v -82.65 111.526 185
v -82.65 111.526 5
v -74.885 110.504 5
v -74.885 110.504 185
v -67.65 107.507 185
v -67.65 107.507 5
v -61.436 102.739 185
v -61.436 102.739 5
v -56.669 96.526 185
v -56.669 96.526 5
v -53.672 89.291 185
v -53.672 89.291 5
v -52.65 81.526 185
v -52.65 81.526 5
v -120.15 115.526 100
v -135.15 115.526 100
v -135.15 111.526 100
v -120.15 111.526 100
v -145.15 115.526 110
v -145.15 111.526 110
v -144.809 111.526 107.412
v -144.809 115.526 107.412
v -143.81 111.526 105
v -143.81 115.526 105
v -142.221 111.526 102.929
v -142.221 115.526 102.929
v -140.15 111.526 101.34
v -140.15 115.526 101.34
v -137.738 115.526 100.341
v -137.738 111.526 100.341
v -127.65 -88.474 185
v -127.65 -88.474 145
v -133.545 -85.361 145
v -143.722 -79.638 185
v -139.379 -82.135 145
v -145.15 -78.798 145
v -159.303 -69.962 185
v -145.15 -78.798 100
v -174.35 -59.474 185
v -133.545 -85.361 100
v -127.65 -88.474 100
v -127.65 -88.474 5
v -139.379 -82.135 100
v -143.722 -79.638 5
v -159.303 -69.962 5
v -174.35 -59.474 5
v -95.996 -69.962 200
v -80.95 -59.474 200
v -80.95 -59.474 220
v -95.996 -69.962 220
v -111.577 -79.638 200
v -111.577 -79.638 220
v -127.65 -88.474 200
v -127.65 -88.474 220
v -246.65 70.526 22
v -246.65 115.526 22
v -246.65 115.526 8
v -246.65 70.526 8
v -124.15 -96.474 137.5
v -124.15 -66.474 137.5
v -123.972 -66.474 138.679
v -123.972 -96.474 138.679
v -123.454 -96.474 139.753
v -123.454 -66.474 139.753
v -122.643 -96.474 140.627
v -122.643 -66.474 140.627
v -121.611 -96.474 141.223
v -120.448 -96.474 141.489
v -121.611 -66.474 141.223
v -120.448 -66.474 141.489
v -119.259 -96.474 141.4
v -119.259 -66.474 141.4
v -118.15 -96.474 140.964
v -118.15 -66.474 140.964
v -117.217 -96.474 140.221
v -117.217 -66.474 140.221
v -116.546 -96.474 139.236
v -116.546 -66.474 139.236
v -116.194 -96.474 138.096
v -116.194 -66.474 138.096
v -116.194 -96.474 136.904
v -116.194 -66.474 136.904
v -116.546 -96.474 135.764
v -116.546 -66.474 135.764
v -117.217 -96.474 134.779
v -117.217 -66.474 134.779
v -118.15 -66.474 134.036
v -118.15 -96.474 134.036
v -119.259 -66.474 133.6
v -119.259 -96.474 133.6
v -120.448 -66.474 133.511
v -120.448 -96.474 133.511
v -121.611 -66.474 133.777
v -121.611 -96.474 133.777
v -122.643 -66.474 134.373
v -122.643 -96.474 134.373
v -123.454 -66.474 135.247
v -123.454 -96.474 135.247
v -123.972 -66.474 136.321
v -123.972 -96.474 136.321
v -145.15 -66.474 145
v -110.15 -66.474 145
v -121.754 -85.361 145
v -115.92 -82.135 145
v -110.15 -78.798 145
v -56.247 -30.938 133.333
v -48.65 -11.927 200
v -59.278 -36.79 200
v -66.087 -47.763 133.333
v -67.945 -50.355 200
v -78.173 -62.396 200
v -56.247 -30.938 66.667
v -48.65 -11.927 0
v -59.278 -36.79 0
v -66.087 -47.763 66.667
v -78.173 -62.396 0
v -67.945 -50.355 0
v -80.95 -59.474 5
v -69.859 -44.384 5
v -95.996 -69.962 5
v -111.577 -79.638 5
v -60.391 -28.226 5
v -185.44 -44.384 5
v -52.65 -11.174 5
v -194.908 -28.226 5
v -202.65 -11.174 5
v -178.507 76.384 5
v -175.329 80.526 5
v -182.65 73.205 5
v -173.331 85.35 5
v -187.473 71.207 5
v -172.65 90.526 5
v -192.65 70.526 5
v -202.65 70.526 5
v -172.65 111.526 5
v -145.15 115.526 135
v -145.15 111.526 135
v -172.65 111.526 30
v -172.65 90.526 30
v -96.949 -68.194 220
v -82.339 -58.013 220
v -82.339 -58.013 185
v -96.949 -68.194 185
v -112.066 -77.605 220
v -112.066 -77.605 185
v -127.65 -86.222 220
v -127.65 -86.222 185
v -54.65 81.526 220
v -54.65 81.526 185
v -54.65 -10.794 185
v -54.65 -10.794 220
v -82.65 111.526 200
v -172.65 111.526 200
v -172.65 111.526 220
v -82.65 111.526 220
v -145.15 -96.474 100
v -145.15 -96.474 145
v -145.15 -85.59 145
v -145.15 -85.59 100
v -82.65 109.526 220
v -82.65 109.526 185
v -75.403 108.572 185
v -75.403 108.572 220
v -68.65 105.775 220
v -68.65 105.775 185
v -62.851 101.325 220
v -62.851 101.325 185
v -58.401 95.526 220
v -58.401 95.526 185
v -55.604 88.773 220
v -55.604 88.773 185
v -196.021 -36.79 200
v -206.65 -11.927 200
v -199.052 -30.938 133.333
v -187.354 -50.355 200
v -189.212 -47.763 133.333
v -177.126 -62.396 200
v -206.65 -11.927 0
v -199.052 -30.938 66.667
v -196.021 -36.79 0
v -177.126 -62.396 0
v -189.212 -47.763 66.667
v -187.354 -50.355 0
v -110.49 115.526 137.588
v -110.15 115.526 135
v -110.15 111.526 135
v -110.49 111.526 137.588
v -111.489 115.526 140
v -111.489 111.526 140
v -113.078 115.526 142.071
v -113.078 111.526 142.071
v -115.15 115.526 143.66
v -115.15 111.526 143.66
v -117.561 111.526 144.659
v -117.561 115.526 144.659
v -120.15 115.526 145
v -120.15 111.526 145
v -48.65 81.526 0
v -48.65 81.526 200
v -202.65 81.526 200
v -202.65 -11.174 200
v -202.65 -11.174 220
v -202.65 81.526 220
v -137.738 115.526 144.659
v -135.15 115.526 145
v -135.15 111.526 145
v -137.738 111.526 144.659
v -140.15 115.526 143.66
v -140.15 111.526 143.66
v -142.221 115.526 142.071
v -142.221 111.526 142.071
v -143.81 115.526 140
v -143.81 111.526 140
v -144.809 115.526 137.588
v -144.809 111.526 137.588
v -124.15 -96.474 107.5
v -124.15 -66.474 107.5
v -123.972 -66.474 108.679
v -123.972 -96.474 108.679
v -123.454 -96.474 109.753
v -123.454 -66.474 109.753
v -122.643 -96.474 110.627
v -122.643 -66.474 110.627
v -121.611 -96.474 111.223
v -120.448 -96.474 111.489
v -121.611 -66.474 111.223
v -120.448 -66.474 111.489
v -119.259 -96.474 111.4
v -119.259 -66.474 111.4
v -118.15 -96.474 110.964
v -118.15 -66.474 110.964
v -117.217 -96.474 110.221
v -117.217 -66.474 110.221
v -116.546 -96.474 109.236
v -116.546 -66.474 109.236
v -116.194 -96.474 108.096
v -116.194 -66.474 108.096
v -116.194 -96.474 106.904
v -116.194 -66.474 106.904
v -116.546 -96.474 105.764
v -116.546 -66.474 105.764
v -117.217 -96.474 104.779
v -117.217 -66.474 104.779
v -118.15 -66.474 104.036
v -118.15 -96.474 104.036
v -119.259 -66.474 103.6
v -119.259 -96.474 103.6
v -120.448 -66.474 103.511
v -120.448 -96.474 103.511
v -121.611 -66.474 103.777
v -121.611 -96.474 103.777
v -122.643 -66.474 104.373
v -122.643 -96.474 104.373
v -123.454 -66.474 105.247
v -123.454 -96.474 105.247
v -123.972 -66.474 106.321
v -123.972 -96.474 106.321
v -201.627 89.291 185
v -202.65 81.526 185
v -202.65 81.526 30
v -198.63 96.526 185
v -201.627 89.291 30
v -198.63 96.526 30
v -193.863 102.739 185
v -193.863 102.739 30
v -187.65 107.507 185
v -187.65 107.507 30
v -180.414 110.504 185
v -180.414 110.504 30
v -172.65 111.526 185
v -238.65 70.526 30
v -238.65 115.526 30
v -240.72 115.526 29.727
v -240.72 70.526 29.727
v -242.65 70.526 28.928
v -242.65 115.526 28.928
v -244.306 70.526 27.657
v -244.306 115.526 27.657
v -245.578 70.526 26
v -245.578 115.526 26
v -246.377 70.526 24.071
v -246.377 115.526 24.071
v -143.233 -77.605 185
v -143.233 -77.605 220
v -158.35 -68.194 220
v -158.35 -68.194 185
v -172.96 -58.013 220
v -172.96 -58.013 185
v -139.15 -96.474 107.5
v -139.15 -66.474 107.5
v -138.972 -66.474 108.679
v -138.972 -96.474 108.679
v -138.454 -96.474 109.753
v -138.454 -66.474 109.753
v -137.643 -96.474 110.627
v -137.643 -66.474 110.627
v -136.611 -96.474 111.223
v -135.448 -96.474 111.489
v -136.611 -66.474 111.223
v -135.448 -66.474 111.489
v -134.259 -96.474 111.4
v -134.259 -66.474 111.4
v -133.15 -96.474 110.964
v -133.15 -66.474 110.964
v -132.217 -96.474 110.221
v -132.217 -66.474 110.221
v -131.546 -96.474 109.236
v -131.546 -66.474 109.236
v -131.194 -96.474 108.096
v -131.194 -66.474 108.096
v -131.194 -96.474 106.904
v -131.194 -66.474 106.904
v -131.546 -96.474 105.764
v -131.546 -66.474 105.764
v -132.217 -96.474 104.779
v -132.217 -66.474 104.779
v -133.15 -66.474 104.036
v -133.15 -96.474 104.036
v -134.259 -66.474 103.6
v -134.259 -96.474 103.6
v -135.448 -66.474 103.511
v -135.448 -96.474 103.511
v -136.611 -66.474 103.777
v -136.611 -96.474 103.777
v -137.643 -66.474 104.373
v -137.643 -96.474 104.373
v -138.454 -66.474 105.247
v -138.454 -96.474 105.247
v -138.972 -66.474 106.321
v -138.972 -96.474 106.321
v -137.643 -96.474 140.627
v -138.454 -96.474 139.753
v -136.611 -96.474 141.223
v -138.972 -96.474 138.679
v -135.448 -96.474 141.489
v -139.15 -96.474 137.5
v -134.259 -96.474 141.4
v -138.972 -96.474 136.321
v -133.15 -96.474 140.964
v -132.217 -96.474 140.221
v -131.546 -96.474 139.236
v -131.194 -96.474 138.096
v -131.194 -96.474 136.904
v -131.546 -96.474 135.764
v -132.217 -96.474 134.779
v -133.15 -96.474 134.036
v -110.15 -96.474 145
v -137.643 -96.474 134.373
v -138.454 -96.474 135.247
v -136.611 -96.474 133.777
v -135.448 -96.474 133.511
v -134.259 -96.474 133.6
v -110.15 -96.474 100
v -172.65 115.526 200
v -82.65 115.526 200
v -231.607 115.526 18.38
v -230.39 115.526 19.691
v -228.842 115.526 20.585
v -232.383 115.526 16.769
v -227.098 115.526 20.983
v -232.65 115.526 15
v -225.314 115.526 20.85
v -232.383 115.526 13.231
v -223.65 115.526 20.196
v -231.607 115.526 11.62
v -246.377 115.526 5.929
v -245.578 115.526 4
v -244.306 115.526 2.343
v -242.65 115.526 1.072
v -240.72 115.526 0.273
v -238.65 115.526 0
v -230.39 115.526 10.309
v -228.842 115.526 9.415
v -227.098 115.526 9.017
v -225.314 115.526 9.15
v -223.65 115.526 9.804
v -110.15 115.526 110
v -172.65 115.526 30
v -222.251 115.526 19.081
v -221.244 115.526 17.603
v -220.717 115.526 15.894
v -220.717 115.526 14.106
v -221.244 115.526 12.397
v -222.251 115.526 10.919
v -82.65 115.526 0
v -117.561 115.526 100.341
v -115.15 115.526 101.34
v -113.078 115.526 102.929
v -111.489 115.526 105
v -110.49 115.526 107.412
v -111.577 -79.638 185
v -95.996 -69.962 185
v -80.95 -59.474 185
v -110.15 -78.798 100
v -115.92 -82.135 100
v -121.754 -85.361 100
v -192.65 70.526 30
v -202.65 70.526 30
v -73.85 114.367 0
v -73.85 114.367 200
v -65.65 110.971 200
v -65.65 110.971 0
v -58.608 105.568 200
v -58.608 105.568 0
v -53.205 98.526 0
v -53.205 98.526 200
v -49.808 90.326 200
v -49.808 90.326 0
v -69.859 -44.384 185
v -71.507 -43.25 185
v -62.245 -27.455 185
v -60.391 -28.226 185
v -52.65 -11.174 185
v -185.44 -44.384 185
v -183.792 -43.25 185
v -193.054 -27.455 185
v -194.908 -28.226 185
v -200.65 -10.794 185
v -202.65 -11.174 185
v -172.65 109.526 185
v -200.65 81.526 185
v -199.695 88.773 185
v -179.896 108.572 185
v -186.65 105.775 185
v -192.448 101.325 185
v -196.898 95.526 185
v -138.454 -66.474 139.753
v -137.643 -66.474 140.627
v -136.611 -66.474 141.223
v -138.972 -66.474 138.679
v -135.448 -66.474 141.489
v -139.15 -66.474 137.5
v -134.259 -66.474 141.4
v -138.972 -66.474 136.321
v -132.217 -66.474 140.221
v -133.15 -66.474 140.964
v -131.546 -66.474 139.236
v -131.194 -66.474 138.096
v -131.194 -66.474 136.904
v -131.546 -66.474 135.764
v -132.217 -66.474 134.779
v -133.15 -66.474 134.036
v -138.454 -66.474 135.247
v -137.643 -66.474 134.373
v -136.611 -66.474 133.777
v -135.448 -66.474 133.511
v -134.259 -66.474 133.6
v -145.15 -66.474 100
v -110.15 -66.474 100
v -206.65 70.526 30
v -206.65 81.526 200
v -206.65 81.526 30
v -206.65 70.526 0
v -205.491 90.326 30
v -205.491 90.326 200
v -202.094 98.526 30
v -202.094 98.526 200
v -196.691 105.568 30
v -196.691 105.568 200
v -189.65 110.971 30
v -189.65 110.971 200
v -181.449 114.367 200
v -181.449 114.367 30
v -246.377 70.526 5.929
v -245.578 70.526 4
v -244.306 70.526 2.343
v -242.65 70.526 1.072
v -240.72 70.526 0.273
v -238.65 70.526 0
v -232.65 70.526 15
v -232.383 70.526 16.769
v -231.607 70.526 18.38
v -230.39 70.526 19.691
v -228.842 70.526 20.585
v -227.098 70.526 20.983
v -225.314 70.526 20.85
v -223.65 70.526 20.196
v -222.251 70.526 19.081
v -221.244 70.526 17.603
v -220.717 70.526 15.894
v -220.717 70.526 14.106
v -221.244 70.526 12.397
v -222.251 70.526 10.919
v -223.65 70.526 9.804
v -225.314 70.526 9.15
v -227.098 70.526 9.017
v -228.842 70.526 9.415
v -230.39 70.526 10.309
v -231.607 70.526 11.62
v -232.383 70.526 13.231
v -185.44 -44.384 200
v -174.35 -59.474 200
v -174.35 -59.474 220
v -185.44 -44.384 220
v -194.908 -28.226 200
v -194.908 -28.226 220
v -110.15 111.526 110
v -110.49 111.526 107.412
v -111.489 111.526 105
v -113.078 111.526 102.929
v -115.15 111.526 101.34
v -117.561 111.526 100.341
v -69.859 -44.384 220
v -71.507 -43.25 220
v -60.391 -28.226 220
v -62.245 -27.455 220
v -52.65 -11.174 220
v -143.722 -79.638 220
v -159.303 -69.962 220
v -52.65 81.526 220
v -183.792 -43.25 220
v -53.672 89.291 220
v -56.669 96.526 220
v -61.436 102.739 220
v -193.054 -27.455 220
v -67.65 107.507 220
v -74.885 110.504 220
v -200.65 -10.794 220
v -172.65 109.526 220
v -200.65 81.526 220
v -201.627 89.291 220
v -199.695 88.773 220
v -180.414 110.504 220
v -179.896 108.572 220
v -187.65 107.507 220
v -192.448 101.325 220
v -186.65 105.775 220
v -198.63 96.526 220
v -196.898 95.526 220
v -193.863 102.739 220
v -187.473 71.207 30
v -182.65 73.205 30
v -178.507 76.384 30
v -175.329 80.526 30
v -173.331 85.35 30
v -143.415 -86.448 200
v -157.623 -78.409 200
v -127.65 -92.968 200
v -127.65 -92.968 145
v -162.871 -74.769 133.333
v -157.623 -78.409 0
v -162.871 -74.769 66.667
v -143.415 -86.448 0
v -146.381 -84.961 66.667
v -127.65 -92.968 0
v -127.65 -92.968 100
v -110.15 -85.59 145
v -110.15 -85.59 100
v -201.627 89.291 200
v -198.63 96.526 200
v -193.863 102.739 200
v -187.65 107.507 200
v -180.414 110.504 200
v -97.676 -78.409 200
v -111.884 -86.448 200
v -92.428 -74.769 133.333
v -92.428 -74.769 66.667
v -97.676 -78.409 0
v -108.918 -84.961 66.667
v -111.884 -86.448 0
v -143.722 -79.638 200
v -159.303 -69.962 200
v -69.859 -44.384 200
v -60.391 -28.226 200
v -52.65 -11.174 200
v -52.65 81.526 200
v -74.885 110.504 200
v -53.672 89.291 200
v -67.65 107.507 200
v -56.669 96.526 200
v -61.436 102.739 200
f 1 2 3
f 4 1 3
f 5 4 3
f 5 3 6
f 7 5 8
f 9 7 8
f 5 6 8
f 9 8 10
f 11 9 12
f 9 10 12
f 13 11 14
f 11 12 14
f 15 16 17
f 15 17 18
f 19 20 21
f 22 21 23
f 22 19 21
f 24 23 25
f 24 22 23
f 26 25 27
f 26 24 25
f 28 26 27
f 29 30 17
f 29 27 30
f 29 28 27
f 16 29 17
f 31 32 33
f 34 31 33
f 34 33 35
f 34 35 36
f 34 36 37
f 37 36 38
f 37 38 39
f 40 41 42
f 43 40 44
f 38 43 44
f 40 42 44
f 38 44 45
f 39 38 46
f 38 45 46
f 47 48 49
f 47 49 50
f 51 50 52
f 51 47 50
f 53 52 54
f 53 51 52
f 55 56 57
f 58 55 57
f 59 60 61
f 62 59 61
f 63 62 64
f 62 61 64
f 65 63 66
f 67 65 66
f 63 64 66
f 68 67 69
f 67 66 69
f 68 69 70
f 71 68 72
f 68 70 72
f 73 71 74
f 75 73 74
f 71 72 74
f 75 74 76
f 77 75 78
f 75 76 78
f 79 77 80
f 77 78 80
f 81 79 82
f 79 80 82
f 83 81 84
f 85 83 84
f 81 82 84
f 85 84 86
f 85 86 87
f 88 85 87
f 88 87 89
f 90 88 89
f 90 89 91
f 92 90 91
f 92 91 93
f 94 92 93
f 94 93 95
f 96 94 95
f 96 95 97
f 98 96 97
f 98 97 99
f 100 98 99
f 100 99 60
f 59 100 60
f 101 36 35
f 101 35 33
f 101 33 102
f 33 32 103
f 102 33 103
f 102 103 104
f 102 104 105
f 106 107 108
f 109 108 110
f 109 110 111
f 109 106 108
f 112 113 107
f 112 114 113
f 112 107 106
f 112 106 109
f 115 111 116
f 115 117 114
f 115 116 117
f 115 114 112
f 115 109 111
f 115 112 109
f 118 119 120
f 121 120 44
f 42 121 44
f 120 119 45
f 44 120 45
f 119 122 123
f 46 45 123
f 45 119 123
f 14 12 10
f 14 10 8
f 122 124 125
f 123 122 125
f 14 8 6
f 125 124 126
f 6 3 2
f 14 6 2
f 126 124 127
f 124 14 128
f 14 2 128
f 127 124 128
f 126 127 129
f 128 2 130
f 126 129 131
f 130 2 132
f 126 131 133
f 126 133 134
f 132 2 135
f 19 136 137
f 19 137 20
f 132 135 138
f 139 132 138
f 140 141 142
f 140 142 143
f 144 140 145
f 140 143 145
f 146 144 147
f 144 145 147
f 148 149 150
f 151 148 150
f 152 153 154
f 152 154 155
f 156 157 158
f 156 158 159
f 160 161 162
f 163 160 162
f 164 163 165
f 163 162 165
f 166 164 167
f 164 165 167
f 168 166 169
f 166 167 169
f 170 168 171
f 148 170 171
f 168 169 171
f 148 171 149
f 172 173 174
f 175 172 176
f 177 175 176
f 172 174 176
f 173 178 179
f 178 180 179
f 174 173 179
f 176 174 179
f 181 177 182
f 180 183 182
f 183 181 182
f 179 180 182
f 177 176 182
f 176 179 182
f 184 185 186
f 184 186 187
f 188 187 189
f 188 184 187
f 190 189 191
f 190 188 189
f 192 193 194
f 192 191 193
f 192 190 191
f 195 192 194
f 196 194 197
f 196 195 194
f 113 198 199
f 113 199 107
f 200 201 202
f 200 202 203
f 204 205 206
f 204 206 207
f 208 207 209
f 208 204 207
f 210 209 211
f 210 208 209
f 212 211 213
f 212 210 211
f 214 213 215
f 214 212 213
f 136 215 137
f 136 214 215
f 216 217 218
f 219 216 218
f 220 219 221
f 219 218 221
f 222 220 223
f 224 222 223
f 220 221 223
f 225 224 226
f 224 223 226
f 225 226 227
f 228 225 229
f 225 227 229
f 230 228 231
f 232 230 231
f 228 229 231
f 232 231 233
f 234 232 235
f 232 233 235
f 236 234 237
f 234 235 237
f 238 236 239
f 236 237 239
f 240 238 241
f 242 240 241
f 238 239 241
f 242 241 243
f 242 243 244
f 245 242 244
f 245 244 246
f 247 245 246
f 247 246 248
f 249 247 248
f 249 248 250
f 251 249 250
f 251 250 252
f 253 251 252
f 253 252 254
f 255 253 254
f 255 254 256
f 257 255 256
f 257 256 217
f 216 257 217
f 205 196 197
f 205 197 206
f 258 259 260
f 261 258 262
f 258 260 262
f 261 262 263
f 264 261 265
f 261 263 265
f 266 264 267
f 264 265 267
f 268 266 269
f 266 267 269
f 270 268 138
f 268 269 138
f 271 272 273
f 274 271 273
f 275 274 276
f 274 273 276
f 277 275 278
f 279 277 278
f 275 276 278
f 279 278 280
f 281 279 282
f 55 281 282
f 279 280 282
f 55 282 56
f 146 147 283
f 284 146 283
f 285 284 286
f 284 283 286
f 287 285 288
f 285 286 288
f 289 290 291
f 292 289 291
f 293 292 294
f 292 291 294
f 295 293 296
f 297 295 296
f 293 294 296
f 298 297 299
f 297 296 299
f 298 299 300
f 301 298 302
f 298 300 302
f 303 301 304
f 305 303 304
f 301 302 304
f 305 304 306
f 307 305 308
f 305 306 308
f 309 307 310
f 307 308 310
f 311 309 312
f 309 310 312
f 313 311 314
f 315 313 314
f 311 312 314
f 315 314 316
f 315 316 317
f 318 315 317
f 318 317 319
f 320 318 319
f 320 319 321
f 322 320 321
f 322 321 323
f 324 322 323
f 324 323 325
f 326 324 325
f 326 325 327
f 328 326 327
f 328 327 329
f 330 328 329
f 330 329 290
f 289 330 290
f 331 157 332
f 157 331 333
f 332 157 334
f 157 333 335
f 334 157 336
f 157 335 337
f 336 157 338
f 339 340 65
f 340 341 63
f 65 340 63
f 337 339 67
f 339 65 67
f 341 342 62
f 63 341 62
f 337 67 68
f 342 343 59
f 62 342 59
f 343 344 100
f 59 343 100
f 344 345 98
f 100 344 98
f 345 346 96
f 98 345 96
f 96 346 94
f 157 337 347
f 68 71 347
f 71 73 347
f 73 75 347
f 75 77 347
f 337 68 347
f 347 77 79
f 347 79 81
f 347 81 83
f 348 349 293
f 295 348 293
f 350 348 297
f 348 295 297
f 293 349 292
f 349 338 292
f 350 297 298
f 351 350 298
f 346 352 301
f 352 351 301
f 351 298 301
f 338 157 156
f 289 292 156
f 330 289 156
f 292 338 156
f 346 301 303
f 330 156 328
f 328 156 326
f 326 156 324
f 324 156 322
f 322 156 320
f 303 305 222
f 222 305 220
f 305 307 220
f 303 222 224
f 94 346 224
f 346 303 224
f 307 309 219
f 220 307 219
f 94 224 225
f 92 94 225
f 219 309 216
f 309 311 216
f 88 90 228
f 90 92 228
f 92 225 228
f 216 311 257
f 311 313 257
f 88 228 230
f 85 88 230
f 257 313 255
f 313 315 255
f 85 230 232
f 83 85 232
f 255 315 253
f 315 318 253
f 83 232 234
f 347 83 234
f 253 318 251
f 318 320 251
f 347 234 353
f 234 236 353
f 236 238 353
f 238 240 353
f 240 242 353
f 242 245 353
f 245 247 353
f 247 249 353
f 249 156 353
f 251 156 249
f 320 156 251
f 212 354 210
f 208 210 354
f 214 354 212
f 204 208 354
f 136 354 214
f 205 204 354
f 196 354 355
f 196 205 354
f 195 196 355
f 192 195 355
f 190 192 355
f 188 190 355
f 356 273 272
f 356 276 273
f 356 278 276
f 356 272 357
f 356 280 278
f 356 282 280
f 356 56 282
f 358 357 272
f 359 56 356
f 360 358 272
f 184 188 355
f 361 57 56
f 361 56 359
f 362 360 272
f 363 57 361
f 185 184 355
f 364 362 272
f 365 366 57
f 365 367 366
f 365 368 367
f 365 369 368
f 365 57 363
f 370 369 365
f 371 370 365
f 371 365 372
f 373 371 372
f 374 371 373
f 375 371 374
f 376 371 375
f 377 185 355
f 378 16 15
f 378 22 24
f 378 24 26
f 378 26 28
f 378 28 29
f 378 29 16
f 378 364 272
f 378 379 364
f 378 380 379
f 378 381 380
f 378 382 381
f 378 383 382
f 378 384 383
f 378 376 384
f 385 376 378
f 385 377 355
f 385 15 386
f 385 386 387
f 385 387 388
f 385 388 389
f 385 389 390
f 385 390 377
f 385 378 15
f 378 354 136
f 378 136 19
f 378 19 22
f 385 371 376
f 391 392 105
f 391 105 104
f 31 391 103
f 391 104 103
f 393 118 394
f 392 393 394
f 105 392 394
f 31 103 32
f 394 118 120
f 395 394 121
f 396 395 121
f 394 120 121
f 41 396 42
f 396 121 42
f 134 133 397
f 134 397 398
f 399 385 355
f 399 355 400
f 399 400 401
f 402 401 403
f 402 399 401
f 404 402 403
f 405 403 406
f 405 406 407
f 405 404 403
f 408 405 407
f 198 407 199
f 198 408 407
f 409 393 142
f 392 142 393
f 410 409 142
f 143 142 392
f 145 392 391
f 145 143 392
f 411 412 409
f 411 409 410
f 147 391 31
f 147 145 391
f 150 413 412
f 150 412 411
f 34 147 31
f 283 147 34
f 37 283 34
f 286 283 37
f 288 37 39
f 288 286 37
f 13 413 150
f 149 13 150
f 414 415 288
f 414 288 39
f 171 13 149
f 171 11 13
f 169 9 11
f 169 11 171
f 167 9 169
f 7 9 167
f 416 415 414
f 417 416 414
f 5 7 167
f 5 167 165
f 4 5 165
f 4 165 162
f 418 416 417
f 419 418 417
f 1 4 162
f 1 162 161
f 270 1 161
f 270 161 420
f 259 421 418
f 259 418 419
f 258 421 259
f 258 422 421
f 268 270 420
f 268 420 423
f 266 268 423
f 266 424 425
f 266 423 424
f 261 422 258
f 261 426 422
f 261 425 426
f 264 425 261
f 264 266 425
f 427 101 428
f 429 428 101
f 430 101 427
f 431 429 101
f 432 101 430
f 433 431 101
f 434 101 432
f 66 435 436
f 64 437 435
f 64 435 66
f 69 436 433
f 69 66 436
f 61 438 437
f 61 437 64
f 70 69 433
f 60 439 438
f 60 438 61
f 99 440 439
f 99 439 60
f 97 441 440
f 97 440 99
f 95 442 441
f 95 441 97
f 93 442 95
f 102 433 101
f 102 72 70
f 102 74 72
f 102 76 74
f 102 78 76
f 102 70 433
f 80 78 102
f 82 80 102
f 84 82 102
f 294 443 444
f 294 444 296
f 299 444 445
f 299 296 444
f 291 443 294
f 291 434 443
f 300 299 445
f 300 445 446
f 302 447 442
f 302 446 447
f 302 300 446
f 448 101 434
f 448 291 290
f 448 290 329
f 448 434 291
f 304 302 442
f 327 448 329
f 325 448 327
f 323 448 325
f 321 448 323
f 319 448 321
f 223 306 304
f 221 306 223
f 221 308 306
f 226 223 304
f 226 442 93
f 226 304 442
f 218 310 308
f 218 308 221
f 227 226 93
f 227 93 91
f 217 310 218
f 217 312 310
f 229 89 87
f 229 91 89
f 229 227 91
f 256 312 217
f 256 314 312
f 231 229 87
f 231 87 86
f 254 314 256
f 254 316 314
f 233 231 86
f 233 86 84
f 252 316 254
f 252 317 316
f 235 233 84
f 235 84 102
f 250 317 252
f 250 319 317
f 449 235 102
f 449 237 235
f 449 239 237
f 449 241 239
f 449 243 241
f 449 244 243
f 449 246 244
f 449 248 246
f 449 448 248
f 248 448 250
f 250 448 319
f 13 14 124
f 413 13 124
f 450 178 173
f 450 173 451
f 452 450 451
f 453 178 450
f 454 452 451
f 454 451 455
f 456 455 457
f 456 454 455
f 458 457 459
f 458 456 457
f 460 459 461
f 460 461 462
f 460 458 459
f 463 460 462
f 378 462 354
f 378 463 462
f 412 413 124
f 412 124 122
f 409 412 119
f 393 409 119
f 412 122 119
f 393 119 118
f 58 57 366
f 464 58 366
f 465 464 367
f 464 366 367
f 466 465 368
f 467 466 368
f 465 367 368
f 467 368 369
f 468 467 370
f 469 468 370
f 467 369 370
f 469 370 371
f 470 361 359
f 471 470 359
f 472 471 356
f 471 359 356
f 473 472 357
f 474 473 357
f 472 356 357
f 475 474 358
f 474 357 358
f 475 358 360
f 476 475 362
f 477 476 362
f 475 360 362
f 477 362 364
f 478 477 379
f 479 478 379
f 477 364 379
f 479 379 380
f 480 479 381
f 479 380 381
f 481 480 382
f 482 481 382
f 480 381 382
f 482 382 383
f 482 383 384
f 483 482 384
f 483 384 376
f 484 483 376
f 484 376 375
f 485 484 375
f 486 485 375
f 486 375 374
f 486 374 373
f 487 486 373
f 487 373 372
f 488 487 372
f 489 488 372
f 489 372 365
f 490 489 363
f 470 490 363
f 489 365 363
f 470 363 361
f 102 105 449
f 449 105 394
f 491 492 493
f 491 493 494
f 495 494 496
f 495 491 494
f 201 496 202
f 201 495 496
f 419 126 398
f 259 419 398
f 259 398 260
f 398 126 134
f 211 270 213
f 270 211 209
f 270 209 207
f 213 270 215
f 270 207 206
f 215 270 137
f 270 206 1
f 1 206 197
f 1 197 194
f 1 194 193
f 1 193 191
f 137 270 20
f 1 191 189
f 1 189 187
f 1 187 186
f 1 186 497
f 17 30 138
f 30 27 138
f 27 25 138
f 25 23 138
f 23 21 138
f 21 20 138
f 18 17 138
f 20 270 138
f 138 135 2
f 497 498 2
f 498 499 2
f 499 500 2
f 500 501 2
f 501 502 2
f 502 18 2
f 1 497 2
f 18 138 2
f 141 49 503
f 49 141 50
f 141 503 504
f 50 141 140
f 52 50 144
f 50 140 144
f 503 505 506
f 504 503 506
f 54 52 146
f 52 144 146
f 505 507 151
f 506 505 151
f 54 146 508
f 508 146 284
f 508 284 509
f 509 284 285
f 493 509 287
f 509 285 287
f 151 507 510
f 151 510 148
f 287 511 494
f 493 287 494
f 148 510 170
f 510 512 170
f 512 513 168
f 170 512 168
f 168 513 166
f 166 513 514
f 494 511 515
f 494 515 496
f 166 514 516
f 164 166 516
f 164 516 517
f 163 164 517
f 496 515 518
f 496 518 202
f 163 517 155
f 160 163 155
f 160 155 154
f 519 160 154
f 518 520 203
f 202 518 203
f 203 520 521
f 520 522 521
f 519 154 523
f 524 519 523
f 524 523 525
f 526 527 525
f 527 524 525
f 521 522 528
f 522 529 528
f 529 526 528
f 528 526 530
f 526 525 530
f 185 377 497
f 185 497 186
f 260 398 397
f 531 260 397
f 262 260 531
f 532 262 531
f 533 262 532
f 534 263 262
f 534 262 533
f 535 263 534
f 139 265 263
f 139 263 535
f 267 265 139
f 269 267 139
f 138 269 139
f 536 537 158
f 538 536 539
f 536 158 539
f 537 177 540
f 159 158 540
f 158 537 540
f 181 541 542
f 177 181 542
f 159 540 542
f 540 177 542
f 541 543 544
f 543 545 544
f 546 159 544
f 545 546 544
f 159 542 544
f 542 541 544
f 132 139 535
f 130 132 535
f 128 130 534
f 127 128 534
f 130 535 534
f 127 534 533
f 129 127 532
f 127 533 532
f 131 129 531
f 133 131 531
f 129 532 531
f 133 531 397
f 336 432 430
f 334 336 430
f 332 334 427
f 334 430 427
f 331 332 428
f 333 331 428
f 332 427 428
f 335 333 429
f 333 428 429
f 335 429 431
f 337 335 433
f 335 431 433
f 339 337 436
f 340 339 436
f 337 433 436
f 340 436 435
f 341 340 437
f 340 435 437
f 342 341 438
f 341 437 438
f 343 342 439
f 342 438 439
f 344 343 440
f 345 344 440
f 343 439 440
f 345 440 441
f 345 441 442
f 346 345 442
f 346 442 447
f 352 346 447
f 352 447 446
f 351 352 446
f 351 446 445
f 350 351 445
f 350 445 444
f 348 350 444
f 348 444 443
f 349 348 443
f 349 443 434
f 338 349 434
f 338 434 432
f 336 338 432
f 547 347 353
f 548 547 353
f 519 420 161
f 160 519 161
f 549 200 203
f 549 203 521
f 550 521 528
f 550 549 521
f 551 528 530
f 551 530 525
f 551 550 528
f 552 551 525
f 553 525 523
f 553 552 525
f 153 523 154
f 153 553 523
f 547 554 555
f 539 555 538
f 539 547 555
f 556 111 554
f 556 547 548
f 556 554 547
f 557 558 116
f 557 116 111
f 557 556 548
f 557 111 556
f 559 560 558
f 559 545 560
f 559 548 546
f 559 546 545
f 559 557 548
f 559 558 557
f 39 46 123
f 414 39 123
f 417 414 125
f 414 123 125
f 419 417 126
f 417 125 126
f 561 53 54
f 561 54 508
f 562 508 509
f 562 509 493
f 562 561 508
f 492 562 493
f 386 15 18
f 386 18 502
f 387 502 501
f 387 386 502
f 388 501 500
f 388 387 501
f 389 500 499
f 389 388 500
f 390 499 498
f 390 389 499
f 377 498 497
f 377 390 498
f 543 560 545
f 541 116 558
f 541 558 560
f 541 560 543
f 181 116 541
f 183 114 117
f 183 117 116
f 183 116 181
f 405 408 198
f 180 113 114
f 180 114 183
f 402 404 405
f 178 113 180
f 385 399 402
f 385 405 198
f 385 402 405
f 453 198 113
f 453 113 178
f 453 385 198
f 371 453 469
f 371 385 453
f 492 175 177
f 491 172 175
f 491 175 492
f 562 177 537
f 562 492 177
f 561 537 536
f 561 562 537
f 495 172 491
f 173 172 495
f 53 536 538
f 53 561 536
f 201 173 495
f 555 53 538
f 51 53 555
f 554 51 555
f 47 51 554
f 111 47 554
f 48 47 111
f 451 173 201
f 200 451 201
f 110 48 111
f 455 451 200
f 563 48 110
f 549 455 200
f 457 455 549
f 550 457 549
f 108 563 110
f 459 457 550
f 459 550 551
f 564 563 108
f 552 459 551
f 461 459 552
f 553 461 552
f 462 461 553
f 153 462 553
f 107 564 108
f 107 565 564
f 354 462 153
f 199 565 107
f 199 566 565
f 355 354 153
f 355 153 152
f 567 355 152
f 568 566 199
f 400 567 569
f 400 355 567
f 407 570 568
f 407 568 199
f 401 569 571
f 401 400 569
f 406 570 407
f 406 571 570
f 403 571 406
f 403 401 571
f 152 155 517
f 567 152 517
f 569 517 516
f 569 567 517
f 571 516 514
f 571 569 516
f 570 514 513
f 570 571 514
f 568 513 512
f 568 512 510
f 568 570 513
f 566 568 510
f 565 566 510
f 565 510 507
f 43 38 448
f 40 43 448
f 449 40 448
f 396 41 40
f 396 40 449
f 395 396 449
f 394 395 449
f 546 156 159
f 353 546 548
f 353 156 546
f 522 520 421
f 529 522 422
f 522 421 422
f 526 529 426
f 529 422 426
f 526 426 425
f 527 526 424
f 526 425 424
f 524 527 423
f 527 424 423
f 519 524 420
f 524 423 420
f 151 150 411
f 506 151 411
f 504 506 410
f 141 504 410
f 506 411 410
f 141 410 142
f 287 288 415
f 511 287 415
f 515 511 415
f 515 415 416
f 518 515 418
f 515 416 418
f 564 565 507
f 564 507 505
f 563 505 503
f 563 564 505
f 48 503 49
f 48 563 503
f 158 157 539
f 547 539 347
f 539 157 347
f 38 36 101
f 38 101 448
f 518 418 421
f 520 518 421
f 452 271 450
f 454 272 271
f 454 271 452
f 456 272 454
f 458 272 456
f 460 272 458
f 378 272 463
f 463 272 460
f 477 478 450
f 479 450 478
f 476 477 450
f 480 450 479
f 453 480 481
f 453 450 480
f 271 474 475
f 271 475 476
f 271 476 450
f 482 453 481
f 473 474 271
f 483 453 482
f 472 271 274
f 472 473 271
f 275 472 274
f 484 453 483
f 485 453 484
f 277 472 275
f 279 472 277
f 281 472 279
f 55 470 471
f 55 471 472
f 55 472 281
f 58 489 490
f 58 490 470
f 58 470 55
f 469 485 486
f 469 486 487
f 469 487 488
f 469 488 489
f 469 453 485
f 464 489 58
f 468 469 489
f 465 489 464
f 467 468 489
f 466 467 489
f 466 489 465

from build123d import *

# Parameters (mm, degrees)
EXTRU_MINCE2_DEPTH       = 200
EPAISSIR5_DEPTH          = 200
EPAISSIR7_DEPTH          = 200
EXTRU_MINCE3_DEPTH       = 20
EXTRU_MINCE3_DEPTH_BACK  = 15
BOSS_EXTRU_2_DEPTH       = 5
ENL_V_MAT_EXTRU_1_DEPTH  = 10
BOSS_EXTRU_3_START       = -212
ESQUISSE12_W             = 35
ESQUISSE12_H             = 45
BOSS_EXTRU_3_DEPTH       = 30
ESQUISSE13_R             = 4
ENL_V_MAT_EXTRU_2_DEPTH  = 250
BOSS_EXTRU_6_DEPTH       = 45
ESQUISSE25_R             = 6
ENL_V_MAT_EXTRU_8_DEPTH  = 45
ENL_V_MAT_EXTRU_9_DEPTH  = 45
ENL_V_MAT_EXTRU_10_DEPTH = 25


# Read off the part's stored shape, not the designer's step: Epaissir5, Epaissir7
with BuildPart() as part:
    # Esquisse3 → Extru.-Mince2 (new body)
    with BuildSketch(Plane.XY):
        with BuildLine():
            Line((-206.649507199, -11.92714811), (-206.649507199, -3.47401752))
            Line((-206.649507199, -3.47401752), (-206.649507199, 81.52598248))
            ThreePointArc((-206.649507199, 81.52598248), (-196.691137759, 105.56761304), (-172.649507199, 115.52598248))
            Line((-172.649507199, 115.52598248), (-82.649507199, 115.52598248))
            ThreePointArc((-82.649507199, 115.52598248), (-58.607876638, 105.56761304), (-48.649507199, 81.52598248))
            Line((-48.649507199, 81.52598248), (-48.649507199, -11.92714811))
            ThreePointArc((-48.649507199, -11.92714811), (-61.399009455, -38.338842544), (-78.173060849, -62.396244951))
            ThreePointArc((-78.173060849, -62.396244951), (-102.275198337, -78.711501116), (-127.649507199, -92.967905467))
            ThreePointArc((-127.649507199, -92.967905467), (-153.023816061, -78.711501116), (-177.125953549, -62.396244951))
            ThreePointArc((-177.125953549, -62.396244951), (-193.900004942, -38.338842544), (-206.649507199, -11.92714811))
        make_face()
        with BuildLine():
            Line((-202.649507199, -11.17401752), (-202.649507199, -3.47401752))
            Line((-202.649507199, -3.47401752), (-202.649507199, 81.52598248))
            ThreePointArc((-202.649507199, 81.52598248), (-193.862710634, 102.739185916), (-172.649507199, 111.52598248))
            Line((-172.649507199, 111.52598248), (-82.649507199, 111.52598248))
            ThreePointArc((-82.649507199, 111.52598248), (-61.436303763, 102.739185916), (-52.649507199, 81.52598248))
            Line((-52.649507199, 81.52598248), (-52.649507199, -11.17401752))
            ThreePointArc((-52.649507199, -11.17401752), (-64.915375774, -36.427970301), (-80.949507199, -59.47401752))
            ThreePointArc((-80.949507199, -59.47401752), (-103.722688687, -74.902894226), (-127.649507199, -88.47401752))
            ThreePointArc((-127.649507199, -88.47401752), (-151.57632571, -74.902894226), (-174.349507199, -59.47401752))
            ThreePointArc((-174.349507199, -59.47401752), (-190.383638623, -36.427970301), (-202.649507199, -11.17401752))
        make_face(mode=Mode.SUBTRACT)
    extrude(amount=EXTRU_MINCE2_DEPTH)

    # Epaissir5 outline → Epaissir5 (add)
    with BuildSketch(Plane.XY):
        with BuildLine():
            add(Edge.make_bspline(
                [(-78.173060849, -62.396244951), (-91.313583381, -75.858349648), (-107.794638855, -86.055391974), (-127.649507199, -92.967905467)],
                knots=[0.501331546, 0.501331546, 0.501331546, 0.501331546, 1, 1, 1, 1], degree=3))
            ThreePointArc((-78.173060849, -62.396244951), (-102.275198337, -78.711501116), (-127.649507199, -92.967905467))
        make_face()
        with BuildLine():
            add(Edge.make_bspline(
                [(-48.649507199, -11.92714811), (-55.127972189, -32.028220402), (-64.962362616, -48.862247174), (-78.173060849, -62.396244951)],
                knots=[0, 0, 0, 0, 0.501331546, 0.501331546, 0.501331546, 0.501331546], degree=3))
            ThreePointArc((-48.649507199, -11.92714811), (-61.399009455, -38.338842545), (-78.173060849, -62.396244951))
        make_face()
    extrude(amount=EPAISSIR5_DEPTH)

    # Epaissir7 outline → Epaissir7 (add)
    with BuildSketch(Plane.XY):
        with BuildLine():
            ThreePointArc((-177.125953549, -62.396244951), (-193.900004942, -38.338842544), (-206.649507199, -11.92714811))
            add(Edge.make_bspline(
                [(-206.649507199, -11.92714811), (-200.171042209, -32.028220402), (-190.336651781, -48.862247174), (-177.125953549, -62.396244951)],
                knots=[0, 0, 0, 0, 0.501331546, 0.501331546, 0.501331546, 0.501331546], degree=3))
        make_face()
        with BuildLine():
            ThreePointArc((-127.649507199, -92.967905467), (-153.023816061, -78.711501116), (-177.125953549, -62.396244951))
            add(Edge.make_bspline(
                [(-177.125953549, -62.396244951), (-163.985431016, -75.858349648), (-147.504375542, -86.055391974), (-127.649507199, -92.967905467)],
                knots=[0.501331546, 0.501331546, 0.501331546, 0.501331546, 1, 1, 1, 1], degree=3))
        make_face()
    extrude(amount=EPAISSIR7_DEPTH)

    # Esquisse7 → Extru.-Mince3 (add, two sides: drawn at the far end of the back side and taken through both)
    with BuildSketch(Plane.XY.offset(200).offset(-EXTRU_MINCE3_DEPTH_BACK)):
        with BuildLine():
            Line((-202.649507199, -11.17401752), (-202.649507199, -3.47401752))
            Line((-202.649507199, -3.47401752), (-202.649507199, 81.52598248))
            ThreePointArc((-202.649507199, 81.52598248), (-193.862710634, 102.739185916), (-172.649507199, 111.52598248))
            Line((-172.649507199, 111.52598248), (-82.649507199, 111.52598248))
            ThreePointArc((-82.649507199, 111.52598248), (-61.436303763, 102.739185916), (-52.649507199, 81.52598248))
            Line((-52.649507199, 81.52598248), (-52.649507199, -11.17401752))
            ThreePointArc((-52.649507199, -11.17401752), (-64.915375774, -36.427970301), (-80.949507199, -59.47401752))
            ThreePointArc((-80.949507199, -59.47401752), (-103.722688687, -74.902894226), (-127.649507199, -88.47401752))
            ThreePointArc((-127.649507199, -88.47401752), (-151.57632571, -74.902894226), (-174.349507199, -59.47401752))
            ThreePointArc((-174.349507199, -59.47401752), (-190.383638623, -36.427970301), (-202.649507199, -11.17401752))
        make_face()
        with BuildLine():
            Line((-200.649507199, -10.794210022), (-200.649507199, -3.47401752))
            Line((-200.649507199, -3.47401752), (-200.649507199, 81.52598248))
            ThreePointArc((-200.649507199, 81.52598248), (-192.448497072, 101.324972353), (-172.649507199, 109.52598248))
            Line((-172.649507199, 109.52598248), (-82.649507199, 109.52598248))
            ThreePointArc((-82.649507199, 109.52598248), (-62.850517326, 101.324972353), (-54.649507199, 81.52598248))
            Line((-54.649507199, 81.52598248), (-54.649507199, -10.794210022))
            ThreePointArc((-54.649507199, -10.794210022), (-66.673062941, -35.471620796), (-82.338728425, -58.013302636))
            ThreePointArc((-82.338728425, -58.013302636), (-104.44621972, -72.997686116), (-127.649507199, -86.221920301))
            ThreePointArc((-127.649507199, -86.221920301), (-150.852794678, -72.997686116), (-172.960285972, -58.013302636))
            ThreePointArc((-172.960285972, -58.013302636), (-188.625951457, -35.471620796), (-200.649507199, -10.794210022))
        make_face(mode=Mode.SUBTRACT)
    extrude(amount=EXTRU_MINCE3_DEPTH + EXTRU_MINCE3_DEPTH_BACK)

    # Esquisse9 → Boss.-Extru.2 (add)
    with BuildSketch(Plane(origin=(0, 0, 0), x_dir=(-1, 0, 0), z_dir=(0, 0, -1))):
        with BuildLine():
            Line((172.649507199, 111.52598248), (82.649507199, 111.52598248))
            ThreePointArc((82.649507199, 111.52598248), (61.436303763, 102.739185916), (52.649507199, 81.52598248))
            Line((52.649507199, 81.52598248), (52.649507199, -11.17401752))
            ThreePointArc((52.649507199, -11.17401752), (79.415793498, -60.238358109), (127.649507199, -88.47401752))
            ThreePointArc((127.649507199, -88.47401752), (175.815578629, -60.172728481), (202.649507199, -11.17401752))
            Line((202.649507199, -11.17401752), (202.649507199, 81.52598248))
            ThreePointArc((202.649507199, 81.52598248), (193.862710634, 102.739185916), (172.649507199, 111.52598248))
        make_face()
    extrude(amount=-BOSS_EXTRU_2_DEPTH)

    # Esquisse10 → Enlèv. mat.-Extru.1 (cut)
    with BuildSketch(Plane(origin=(0, 115.52598248, 0), x_dir=(1, 0, 0), z_dir=(0, 1, 0))):
        with BuildLine():
            Line((-127.649507199, -100), (-120.149507199, -100))
            ThreePointArc((-120.149507199, -100), (-113.078439387, -102.928932188), (-110.149507199, -110))
            Line((-110.149507199, -110), (-110.149507199, -135))
            ThreePointArc((-110.149507199, -135), (-113.078439387, -142.071067812), (-120.149507199, -145))
            Line((-120.149507199, -145), (-135.149507199, -145))
            ThreePointArc((-135.149507199, -145), (-142.220575011, -142.071067812), (-145.149507199, -135))
            Line((-145.149507199, -135), (-145.149507199, -110))
            ThreePointArc((-145.149507199, -110), (-142.220575011, -102.928932188), (-135.149507199, -100))
            Line((-135.149507199, -100), (-127.649507199, -100))
        make_face()
    extrude(amount=-ENL_V_MAT_EXTRU_1_DEPTH, mode=Mode.SUBTRACT)

    # Esquisse12 → Boss.-Extru.3 (add)
    with BuildSketch(Plane(origin=(0, 115.52598248, 0), x_dir=(1, 0, 0), z_dir=(0, 1, 0)).offset(BOSS_EXTRU_3_START)):
        with Locations((-127.649507199, -122.5)):
            Rectangle(ESQUISSE12_W, ESQUISSE12_H)
    extrude(amount=BOSS_EXTRU_3_DEPTH)

    # Esquisse13 → Enlèv. mat.-Extru.2 (cut)
    with BuildSketch(Plane(origin=(0, 115.52598248, 0), x_dir=(1, 0, 0), z_dir=(0, 1, 0))):
        with Locations(Location((-120.149507199, -107.5, 0), (0, 0, 180))):
            Circle(ESQUISSE13_R)
        with Locations(Location((-135.149507199, -107.5, 0), (0, 0, 180))):
            Circle(ESQUISSE13_R)
        with Locations(Location((-135.149507199, -137.5, 0), (0, 0, 180))):
            Circle(ESQUISSE13_R)
        with Locations(Location((-120.149507199, -137.5, 0), (0, 0, 180))):
            Circle(ESQUISSE13_R)
    extrude(amount=-ENL_V_MAT_EXTRU_2_DEPTH, mode=Mode.SUBTRACT)

    # Esquisse23 → Boss.-Extru.6 (add)
    with BuildSketch(Plane(origin=(0, 115.52598248, 0), x_dir=(1, 0, 0), z_dir=(0, 1, 0))):
        Polygon((-172.649507199, 0), (-172.649507199, -30), (-206.649507199, -30), (-246.649507199, -30), (-246.649507199, 0), align=None)
    extrude(amount=-BOSS_EXTRU_6_DEPTH)

    # Esquisse25 → Enlèv. mat.-Extru.8 (cut)
    with BuildSketch(Plane(origin=(0, 115.52598248, 0), x_dir=(1, 0, 0), z_dir=(0, 1, 0))):
        with Locations(Location((-226.649507199, -15, 0), (0, 0, 180))):
            Circle(ESQUISSE25_R)
    extrude(amount=-ENL_V_MAT_EXTRU_8_DEPTH, mode=Mode.SUBTRACT)

    # Esquisse26 → Enlèv. mat.-Extru.9 (cut)
    with BuildSketch(Plane(origin=(0, 115.52598248, 0), x_dir=(1, 0, 0), z_dir=(0, 1, 0))):
        with BuildLine():
            Line((-246.649507199, 0), (-246.649507199, -8))
            ThreePointArc((-246.649507199, -8), (-244.306361448, -2.343145751), (-238.649507199, 0))
            Line((-238.649507199, 0), (-246.649507199, 0))
        make_face()
        with BuildLine():
            ThreePointArc((-238.649507199, -30), (-244.306361448, -27.656854249), (-246.649507199, -22))
            Line((-246.649507199, -22), (-246.649507199, -30))
            Line((-246.649507199, -30), (-238.649507199, -30))
        make_face()
    extrude(amount=-ENL_V_MAT_EXTRU_9_DEPTH, mode=Mode.SUBTRACT)

    # Esquisse27 → Enlèv. mat.-Extru.10 (cut)
    with BuildSketch(Plane.XY.offset(30)):
        with BuildLine():
            Line((-172.649507199, 70.52598248), (-172.649507199, 90.52598248))
            ThreePointArc((-172.649507199, 90.52598248), (-178.507371575, 76.383846856), (-192.649507199, 70.52598248))
            Line((-192.649507199, 70.52598248), (-172.649507199, 70.52598248))
        make_face()
    extrude(amount=-ENL_V_MAT_EXTRU_10_DEPTH, mode=Mode.SUBTRACT)


solid = part.part
